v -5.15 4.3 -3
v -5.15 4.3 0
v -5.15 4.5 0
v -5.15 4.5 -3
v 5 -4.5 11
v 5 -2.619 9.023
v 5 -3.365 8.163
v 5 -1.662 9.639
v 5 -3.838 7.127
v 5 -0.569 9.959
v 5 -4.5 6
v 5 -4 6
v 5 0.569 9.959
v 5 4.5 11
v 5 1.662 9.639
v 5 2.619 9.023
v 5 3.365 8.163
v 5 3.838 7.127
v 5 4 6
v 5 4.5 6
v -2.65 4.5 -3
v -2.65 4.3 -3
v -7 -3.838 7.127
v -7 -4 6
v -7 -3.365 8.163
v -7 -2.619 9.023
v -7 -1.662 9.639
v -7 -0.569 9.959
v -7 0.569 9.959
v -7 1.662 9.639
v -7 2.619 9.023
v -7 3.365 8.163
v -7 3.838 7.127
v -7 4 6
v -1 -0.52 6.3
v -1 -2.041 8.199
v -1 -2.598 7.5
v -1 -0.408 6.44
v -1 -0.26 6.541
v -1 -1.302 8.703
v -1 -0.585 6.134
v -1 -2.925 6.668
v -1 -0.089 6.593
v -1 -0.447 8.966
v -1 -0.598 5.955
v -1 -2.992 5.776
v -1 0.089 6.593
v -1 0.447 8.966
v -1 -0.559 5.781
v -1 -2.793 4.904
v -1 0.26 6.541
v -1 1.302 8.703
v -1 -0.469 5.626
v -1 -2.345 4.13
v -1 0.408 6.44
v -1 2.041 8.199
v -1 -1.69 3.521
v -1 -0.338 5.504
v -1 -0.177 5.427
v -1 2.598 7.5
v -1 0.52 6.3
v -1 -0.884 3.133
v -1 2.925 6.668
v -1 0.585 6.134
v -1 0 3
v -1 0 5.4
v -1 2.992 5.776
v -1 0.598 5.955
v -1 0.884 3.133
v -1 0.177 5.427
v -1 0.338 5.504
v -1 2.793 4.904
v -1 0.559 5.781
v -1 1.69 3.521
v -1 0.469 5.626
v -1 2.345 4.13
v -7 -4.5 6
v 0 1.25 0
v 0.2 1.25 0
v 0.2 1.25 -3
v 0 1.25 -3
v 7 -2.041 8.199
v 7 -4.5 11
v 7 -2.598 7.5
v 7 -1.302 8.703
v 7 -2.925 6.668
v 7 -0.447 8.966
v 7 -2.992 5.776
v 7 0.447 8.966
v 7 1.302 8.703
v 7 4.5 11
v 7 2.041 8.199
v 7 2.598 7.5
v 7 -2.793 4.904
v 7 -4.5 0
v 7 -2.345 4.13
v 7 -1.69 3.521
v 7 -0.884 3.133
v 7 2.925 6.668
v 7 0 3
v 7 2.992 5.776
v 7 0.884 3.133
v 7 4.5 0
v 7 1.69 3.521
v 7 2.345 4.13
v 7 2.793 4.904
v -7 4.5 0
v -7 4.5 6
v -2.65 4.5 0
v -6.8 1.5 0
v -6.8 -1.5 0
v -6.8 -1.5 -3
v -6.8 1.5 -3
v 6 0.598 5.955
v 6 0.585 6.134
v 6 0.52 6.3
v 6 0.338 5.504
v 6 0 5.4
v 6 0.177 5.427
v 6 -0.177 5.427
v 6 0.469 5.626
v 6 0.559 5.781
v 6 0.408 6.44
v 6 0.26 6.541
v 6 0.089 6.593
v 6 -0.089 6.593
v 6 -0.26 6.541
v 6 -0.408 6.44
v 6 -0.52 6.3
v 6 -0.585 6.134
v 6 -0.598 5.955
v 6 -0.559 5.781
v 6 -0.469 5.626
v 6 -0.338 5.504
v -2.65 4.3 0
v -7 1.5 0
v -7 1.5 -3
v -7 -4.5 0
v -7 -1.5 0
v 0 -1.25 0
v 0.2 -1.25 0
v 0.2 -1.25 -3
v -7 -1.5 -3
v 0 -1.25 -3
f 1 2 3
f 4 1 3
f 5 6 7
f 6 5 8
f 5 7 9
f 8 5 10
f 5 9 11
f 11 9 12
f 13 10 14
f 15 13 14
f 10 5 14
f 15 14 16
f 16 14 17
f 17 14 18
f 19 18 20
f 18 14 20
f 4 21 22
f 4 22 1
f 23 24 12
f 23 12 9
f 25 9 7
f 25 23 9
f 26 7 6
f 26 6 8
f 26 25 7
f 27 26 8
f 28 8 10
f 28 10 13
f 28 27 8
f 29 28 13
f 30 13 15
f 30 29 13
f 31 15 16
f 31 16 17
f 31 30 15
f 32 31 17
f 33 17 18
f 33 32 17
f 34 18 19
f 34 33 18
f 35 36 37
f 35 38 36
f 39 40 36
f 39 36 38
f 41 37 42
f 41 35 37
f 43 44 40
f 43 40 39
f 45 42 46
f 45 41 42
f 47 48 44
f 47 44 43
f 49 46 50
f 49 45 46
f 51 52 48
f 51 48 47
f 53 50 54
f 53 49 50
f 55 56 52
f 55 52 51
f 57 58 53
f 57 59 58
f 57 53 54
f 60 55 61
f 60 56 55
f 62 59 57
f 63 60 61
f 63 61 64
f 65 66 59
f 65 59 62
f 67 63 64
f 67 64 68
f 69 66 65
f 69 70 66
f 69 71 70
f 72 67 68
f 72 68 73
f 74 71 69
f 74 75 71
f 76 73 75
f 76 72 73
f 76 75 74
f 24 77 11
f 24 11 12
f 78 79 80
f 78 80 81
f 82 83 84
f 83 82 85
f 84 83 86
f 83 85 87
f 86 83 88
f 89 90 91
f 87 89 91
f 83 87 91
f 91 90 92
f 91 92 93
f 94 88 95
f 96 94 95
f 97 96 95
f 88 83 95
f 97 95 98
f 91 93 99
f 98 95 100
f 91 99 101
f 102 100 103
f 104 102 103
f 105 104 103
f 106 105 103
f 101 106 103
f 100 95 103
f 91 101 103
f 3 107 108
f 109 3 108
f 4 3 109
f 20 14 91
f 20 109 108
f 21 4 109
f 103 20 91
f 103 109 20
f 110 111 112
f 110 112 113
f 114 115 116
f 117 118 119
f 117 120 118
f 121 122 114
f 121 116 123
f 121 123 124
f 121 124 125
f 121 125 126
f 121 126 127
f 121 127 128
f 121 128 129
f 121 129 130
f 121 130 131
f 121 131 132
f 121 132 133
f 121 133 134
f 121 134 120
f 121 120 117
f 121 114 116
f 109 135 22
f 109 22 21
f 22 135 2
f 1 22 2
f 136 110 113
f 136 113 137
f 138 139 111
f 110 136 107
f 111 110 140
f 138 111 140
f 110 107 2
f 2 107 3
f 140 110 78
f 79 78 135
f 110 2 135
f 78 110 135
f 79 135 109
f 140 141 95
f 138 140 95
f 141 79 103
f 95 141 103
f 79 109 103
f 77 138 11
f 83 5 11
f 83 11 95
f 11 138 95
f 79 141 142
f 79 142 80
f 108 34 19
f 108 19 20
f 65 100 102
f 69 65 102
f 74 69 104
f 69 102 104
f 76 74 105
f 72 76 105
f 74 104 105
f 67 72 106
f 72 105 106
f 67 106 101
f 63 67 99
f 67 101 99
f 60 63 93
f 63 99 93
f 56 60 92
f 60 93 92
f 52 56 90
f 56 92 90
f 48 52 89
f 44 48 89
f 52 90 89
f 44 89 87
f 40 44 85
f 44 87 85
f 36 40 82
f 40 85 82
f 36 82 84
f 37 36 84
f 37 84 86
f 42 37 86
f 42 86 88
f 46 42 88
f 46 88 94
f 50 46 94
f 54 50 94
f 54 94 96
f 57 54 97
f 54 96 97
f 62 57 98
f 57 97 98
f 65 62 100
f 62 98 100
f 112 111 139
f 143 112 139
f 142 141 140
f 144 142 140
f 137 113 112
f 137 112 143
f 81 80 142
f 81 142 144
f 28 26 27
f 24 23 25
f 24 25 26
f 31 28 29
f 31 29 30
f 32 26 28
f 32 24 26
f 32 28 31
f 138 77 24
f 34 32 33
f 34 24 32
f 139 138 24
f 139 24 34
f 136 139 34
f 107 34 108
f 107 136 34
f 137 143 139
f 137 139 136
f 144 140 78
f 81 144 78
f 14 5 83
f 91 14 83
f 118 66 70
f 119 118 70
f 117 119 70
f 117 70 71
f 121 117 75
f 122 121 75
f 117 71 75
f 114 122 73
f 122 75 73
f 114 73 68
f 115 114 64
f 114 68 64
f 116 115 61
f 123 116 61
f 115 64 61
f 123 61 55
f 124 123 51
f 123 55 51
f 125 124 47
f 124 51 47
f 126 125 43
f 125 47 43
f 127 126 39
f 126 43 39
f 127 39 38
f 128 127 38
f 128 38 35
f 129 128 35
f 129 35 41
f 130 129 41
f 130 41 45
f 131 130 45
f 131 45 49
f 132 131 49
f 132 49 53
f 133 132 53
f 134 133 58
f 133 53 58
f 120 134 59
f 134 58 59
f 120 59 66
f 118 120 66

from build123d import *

# Parameters (mm, degrees)
SKETCH_1_W          = 14
SKETCH_1_H          = 9
EXTRUDE_1_DEPTH     = 11
SKETCH_3_R          = 3
CUT_EXTRUDE_1_DEPTH = 8
SKETCH_5_R          = 0.6
EXTRUDE_2_DEPTH     = 7
CUT_EXTRUDE_2_DEPTH = 12
SKETCH_7_W          = 0.2
SKETCH_7_H          = 3
SKETCH_7_H_2        = 2.5
SKETCH_7_W_2        = 2.5
SKETCH_7_H_3        = 0.2
EXTRUDE_3_DEPTH     = 3


with BuildPart() as part:
    # 草图1 → 凸台-拉伸1 (new body)
    with BuildSketch(Plane.XY):
        Rectangle(SKETCH_1_W, SKETCH_1_H)
    extrude(amount=EXTRUDE_1_DEPTH)

    # 草图3 → 切除-拉伸1 (cut)
    with BuildSketch(Plane(origin=(7, 0, 0), x_dir=(0, 0, -1), z_dir=(1, 0, 0))):
        with Locations((-6, 0)):
            Circle(SKETCH_3_R)
    extrude(amount=-CUT_EXTRUDE_1_DEPTH, mode=Mode.SUBTRACT)

    # 草图5 → 凸台-拉伸2 (add)
    with BuildSketch(Plane(origin=(-1, 0, 0), x_dir=(0, 0, -1), z_dir=(1, 0, 0))):
        with Locations((-6, 0)):
            Circle(SKETCH_5_R)
    extrude(amount=EXTRUDE_2_DEPTH)

    # 草图6 → 切除-拉伸2 (cut)
    with BuildSketch(Plane.ZY.offset(7)):
        with BuildLine():
            Line((6, 4), (6, 4.5))
            Line((6, 4.5), (11, 4.5))
            Line((11, 4.5), (11, -4.5))
            Line((11, -4.5), (6, -4.5))
            Line((6, -4.5), (6, -4))
            ThreePointArc((6, -4), (10, 0), (6, 4))
        make_face()
    extrude(amount=-CUT_EXTRUDE_2_DEPTH, mode=Mode.SUBTRACT)

    # 草图7 → 凸台-拉伸3 (add)
    with BuildSketch(Plane(origin=(0, 0, 0), x_dir=(-1, 0, 0), z_dir=(0, 0, -1))):
        with Locations((6.9, 0)):
            Rectangle(SKETCH_7_W, SKETCH_7_H)
        with Locations((-0.1, 0)):
            Rectangle(SKETCH_7_W, SKETCH_7_H_2)
        with Locations((3.9, 4.4)):
            Rectangle(SKETCH_7_W_2, SKETCH_7_H_3)
    extrude(amount=EXTRUDE_3_DEPTH)


solid = part.part
